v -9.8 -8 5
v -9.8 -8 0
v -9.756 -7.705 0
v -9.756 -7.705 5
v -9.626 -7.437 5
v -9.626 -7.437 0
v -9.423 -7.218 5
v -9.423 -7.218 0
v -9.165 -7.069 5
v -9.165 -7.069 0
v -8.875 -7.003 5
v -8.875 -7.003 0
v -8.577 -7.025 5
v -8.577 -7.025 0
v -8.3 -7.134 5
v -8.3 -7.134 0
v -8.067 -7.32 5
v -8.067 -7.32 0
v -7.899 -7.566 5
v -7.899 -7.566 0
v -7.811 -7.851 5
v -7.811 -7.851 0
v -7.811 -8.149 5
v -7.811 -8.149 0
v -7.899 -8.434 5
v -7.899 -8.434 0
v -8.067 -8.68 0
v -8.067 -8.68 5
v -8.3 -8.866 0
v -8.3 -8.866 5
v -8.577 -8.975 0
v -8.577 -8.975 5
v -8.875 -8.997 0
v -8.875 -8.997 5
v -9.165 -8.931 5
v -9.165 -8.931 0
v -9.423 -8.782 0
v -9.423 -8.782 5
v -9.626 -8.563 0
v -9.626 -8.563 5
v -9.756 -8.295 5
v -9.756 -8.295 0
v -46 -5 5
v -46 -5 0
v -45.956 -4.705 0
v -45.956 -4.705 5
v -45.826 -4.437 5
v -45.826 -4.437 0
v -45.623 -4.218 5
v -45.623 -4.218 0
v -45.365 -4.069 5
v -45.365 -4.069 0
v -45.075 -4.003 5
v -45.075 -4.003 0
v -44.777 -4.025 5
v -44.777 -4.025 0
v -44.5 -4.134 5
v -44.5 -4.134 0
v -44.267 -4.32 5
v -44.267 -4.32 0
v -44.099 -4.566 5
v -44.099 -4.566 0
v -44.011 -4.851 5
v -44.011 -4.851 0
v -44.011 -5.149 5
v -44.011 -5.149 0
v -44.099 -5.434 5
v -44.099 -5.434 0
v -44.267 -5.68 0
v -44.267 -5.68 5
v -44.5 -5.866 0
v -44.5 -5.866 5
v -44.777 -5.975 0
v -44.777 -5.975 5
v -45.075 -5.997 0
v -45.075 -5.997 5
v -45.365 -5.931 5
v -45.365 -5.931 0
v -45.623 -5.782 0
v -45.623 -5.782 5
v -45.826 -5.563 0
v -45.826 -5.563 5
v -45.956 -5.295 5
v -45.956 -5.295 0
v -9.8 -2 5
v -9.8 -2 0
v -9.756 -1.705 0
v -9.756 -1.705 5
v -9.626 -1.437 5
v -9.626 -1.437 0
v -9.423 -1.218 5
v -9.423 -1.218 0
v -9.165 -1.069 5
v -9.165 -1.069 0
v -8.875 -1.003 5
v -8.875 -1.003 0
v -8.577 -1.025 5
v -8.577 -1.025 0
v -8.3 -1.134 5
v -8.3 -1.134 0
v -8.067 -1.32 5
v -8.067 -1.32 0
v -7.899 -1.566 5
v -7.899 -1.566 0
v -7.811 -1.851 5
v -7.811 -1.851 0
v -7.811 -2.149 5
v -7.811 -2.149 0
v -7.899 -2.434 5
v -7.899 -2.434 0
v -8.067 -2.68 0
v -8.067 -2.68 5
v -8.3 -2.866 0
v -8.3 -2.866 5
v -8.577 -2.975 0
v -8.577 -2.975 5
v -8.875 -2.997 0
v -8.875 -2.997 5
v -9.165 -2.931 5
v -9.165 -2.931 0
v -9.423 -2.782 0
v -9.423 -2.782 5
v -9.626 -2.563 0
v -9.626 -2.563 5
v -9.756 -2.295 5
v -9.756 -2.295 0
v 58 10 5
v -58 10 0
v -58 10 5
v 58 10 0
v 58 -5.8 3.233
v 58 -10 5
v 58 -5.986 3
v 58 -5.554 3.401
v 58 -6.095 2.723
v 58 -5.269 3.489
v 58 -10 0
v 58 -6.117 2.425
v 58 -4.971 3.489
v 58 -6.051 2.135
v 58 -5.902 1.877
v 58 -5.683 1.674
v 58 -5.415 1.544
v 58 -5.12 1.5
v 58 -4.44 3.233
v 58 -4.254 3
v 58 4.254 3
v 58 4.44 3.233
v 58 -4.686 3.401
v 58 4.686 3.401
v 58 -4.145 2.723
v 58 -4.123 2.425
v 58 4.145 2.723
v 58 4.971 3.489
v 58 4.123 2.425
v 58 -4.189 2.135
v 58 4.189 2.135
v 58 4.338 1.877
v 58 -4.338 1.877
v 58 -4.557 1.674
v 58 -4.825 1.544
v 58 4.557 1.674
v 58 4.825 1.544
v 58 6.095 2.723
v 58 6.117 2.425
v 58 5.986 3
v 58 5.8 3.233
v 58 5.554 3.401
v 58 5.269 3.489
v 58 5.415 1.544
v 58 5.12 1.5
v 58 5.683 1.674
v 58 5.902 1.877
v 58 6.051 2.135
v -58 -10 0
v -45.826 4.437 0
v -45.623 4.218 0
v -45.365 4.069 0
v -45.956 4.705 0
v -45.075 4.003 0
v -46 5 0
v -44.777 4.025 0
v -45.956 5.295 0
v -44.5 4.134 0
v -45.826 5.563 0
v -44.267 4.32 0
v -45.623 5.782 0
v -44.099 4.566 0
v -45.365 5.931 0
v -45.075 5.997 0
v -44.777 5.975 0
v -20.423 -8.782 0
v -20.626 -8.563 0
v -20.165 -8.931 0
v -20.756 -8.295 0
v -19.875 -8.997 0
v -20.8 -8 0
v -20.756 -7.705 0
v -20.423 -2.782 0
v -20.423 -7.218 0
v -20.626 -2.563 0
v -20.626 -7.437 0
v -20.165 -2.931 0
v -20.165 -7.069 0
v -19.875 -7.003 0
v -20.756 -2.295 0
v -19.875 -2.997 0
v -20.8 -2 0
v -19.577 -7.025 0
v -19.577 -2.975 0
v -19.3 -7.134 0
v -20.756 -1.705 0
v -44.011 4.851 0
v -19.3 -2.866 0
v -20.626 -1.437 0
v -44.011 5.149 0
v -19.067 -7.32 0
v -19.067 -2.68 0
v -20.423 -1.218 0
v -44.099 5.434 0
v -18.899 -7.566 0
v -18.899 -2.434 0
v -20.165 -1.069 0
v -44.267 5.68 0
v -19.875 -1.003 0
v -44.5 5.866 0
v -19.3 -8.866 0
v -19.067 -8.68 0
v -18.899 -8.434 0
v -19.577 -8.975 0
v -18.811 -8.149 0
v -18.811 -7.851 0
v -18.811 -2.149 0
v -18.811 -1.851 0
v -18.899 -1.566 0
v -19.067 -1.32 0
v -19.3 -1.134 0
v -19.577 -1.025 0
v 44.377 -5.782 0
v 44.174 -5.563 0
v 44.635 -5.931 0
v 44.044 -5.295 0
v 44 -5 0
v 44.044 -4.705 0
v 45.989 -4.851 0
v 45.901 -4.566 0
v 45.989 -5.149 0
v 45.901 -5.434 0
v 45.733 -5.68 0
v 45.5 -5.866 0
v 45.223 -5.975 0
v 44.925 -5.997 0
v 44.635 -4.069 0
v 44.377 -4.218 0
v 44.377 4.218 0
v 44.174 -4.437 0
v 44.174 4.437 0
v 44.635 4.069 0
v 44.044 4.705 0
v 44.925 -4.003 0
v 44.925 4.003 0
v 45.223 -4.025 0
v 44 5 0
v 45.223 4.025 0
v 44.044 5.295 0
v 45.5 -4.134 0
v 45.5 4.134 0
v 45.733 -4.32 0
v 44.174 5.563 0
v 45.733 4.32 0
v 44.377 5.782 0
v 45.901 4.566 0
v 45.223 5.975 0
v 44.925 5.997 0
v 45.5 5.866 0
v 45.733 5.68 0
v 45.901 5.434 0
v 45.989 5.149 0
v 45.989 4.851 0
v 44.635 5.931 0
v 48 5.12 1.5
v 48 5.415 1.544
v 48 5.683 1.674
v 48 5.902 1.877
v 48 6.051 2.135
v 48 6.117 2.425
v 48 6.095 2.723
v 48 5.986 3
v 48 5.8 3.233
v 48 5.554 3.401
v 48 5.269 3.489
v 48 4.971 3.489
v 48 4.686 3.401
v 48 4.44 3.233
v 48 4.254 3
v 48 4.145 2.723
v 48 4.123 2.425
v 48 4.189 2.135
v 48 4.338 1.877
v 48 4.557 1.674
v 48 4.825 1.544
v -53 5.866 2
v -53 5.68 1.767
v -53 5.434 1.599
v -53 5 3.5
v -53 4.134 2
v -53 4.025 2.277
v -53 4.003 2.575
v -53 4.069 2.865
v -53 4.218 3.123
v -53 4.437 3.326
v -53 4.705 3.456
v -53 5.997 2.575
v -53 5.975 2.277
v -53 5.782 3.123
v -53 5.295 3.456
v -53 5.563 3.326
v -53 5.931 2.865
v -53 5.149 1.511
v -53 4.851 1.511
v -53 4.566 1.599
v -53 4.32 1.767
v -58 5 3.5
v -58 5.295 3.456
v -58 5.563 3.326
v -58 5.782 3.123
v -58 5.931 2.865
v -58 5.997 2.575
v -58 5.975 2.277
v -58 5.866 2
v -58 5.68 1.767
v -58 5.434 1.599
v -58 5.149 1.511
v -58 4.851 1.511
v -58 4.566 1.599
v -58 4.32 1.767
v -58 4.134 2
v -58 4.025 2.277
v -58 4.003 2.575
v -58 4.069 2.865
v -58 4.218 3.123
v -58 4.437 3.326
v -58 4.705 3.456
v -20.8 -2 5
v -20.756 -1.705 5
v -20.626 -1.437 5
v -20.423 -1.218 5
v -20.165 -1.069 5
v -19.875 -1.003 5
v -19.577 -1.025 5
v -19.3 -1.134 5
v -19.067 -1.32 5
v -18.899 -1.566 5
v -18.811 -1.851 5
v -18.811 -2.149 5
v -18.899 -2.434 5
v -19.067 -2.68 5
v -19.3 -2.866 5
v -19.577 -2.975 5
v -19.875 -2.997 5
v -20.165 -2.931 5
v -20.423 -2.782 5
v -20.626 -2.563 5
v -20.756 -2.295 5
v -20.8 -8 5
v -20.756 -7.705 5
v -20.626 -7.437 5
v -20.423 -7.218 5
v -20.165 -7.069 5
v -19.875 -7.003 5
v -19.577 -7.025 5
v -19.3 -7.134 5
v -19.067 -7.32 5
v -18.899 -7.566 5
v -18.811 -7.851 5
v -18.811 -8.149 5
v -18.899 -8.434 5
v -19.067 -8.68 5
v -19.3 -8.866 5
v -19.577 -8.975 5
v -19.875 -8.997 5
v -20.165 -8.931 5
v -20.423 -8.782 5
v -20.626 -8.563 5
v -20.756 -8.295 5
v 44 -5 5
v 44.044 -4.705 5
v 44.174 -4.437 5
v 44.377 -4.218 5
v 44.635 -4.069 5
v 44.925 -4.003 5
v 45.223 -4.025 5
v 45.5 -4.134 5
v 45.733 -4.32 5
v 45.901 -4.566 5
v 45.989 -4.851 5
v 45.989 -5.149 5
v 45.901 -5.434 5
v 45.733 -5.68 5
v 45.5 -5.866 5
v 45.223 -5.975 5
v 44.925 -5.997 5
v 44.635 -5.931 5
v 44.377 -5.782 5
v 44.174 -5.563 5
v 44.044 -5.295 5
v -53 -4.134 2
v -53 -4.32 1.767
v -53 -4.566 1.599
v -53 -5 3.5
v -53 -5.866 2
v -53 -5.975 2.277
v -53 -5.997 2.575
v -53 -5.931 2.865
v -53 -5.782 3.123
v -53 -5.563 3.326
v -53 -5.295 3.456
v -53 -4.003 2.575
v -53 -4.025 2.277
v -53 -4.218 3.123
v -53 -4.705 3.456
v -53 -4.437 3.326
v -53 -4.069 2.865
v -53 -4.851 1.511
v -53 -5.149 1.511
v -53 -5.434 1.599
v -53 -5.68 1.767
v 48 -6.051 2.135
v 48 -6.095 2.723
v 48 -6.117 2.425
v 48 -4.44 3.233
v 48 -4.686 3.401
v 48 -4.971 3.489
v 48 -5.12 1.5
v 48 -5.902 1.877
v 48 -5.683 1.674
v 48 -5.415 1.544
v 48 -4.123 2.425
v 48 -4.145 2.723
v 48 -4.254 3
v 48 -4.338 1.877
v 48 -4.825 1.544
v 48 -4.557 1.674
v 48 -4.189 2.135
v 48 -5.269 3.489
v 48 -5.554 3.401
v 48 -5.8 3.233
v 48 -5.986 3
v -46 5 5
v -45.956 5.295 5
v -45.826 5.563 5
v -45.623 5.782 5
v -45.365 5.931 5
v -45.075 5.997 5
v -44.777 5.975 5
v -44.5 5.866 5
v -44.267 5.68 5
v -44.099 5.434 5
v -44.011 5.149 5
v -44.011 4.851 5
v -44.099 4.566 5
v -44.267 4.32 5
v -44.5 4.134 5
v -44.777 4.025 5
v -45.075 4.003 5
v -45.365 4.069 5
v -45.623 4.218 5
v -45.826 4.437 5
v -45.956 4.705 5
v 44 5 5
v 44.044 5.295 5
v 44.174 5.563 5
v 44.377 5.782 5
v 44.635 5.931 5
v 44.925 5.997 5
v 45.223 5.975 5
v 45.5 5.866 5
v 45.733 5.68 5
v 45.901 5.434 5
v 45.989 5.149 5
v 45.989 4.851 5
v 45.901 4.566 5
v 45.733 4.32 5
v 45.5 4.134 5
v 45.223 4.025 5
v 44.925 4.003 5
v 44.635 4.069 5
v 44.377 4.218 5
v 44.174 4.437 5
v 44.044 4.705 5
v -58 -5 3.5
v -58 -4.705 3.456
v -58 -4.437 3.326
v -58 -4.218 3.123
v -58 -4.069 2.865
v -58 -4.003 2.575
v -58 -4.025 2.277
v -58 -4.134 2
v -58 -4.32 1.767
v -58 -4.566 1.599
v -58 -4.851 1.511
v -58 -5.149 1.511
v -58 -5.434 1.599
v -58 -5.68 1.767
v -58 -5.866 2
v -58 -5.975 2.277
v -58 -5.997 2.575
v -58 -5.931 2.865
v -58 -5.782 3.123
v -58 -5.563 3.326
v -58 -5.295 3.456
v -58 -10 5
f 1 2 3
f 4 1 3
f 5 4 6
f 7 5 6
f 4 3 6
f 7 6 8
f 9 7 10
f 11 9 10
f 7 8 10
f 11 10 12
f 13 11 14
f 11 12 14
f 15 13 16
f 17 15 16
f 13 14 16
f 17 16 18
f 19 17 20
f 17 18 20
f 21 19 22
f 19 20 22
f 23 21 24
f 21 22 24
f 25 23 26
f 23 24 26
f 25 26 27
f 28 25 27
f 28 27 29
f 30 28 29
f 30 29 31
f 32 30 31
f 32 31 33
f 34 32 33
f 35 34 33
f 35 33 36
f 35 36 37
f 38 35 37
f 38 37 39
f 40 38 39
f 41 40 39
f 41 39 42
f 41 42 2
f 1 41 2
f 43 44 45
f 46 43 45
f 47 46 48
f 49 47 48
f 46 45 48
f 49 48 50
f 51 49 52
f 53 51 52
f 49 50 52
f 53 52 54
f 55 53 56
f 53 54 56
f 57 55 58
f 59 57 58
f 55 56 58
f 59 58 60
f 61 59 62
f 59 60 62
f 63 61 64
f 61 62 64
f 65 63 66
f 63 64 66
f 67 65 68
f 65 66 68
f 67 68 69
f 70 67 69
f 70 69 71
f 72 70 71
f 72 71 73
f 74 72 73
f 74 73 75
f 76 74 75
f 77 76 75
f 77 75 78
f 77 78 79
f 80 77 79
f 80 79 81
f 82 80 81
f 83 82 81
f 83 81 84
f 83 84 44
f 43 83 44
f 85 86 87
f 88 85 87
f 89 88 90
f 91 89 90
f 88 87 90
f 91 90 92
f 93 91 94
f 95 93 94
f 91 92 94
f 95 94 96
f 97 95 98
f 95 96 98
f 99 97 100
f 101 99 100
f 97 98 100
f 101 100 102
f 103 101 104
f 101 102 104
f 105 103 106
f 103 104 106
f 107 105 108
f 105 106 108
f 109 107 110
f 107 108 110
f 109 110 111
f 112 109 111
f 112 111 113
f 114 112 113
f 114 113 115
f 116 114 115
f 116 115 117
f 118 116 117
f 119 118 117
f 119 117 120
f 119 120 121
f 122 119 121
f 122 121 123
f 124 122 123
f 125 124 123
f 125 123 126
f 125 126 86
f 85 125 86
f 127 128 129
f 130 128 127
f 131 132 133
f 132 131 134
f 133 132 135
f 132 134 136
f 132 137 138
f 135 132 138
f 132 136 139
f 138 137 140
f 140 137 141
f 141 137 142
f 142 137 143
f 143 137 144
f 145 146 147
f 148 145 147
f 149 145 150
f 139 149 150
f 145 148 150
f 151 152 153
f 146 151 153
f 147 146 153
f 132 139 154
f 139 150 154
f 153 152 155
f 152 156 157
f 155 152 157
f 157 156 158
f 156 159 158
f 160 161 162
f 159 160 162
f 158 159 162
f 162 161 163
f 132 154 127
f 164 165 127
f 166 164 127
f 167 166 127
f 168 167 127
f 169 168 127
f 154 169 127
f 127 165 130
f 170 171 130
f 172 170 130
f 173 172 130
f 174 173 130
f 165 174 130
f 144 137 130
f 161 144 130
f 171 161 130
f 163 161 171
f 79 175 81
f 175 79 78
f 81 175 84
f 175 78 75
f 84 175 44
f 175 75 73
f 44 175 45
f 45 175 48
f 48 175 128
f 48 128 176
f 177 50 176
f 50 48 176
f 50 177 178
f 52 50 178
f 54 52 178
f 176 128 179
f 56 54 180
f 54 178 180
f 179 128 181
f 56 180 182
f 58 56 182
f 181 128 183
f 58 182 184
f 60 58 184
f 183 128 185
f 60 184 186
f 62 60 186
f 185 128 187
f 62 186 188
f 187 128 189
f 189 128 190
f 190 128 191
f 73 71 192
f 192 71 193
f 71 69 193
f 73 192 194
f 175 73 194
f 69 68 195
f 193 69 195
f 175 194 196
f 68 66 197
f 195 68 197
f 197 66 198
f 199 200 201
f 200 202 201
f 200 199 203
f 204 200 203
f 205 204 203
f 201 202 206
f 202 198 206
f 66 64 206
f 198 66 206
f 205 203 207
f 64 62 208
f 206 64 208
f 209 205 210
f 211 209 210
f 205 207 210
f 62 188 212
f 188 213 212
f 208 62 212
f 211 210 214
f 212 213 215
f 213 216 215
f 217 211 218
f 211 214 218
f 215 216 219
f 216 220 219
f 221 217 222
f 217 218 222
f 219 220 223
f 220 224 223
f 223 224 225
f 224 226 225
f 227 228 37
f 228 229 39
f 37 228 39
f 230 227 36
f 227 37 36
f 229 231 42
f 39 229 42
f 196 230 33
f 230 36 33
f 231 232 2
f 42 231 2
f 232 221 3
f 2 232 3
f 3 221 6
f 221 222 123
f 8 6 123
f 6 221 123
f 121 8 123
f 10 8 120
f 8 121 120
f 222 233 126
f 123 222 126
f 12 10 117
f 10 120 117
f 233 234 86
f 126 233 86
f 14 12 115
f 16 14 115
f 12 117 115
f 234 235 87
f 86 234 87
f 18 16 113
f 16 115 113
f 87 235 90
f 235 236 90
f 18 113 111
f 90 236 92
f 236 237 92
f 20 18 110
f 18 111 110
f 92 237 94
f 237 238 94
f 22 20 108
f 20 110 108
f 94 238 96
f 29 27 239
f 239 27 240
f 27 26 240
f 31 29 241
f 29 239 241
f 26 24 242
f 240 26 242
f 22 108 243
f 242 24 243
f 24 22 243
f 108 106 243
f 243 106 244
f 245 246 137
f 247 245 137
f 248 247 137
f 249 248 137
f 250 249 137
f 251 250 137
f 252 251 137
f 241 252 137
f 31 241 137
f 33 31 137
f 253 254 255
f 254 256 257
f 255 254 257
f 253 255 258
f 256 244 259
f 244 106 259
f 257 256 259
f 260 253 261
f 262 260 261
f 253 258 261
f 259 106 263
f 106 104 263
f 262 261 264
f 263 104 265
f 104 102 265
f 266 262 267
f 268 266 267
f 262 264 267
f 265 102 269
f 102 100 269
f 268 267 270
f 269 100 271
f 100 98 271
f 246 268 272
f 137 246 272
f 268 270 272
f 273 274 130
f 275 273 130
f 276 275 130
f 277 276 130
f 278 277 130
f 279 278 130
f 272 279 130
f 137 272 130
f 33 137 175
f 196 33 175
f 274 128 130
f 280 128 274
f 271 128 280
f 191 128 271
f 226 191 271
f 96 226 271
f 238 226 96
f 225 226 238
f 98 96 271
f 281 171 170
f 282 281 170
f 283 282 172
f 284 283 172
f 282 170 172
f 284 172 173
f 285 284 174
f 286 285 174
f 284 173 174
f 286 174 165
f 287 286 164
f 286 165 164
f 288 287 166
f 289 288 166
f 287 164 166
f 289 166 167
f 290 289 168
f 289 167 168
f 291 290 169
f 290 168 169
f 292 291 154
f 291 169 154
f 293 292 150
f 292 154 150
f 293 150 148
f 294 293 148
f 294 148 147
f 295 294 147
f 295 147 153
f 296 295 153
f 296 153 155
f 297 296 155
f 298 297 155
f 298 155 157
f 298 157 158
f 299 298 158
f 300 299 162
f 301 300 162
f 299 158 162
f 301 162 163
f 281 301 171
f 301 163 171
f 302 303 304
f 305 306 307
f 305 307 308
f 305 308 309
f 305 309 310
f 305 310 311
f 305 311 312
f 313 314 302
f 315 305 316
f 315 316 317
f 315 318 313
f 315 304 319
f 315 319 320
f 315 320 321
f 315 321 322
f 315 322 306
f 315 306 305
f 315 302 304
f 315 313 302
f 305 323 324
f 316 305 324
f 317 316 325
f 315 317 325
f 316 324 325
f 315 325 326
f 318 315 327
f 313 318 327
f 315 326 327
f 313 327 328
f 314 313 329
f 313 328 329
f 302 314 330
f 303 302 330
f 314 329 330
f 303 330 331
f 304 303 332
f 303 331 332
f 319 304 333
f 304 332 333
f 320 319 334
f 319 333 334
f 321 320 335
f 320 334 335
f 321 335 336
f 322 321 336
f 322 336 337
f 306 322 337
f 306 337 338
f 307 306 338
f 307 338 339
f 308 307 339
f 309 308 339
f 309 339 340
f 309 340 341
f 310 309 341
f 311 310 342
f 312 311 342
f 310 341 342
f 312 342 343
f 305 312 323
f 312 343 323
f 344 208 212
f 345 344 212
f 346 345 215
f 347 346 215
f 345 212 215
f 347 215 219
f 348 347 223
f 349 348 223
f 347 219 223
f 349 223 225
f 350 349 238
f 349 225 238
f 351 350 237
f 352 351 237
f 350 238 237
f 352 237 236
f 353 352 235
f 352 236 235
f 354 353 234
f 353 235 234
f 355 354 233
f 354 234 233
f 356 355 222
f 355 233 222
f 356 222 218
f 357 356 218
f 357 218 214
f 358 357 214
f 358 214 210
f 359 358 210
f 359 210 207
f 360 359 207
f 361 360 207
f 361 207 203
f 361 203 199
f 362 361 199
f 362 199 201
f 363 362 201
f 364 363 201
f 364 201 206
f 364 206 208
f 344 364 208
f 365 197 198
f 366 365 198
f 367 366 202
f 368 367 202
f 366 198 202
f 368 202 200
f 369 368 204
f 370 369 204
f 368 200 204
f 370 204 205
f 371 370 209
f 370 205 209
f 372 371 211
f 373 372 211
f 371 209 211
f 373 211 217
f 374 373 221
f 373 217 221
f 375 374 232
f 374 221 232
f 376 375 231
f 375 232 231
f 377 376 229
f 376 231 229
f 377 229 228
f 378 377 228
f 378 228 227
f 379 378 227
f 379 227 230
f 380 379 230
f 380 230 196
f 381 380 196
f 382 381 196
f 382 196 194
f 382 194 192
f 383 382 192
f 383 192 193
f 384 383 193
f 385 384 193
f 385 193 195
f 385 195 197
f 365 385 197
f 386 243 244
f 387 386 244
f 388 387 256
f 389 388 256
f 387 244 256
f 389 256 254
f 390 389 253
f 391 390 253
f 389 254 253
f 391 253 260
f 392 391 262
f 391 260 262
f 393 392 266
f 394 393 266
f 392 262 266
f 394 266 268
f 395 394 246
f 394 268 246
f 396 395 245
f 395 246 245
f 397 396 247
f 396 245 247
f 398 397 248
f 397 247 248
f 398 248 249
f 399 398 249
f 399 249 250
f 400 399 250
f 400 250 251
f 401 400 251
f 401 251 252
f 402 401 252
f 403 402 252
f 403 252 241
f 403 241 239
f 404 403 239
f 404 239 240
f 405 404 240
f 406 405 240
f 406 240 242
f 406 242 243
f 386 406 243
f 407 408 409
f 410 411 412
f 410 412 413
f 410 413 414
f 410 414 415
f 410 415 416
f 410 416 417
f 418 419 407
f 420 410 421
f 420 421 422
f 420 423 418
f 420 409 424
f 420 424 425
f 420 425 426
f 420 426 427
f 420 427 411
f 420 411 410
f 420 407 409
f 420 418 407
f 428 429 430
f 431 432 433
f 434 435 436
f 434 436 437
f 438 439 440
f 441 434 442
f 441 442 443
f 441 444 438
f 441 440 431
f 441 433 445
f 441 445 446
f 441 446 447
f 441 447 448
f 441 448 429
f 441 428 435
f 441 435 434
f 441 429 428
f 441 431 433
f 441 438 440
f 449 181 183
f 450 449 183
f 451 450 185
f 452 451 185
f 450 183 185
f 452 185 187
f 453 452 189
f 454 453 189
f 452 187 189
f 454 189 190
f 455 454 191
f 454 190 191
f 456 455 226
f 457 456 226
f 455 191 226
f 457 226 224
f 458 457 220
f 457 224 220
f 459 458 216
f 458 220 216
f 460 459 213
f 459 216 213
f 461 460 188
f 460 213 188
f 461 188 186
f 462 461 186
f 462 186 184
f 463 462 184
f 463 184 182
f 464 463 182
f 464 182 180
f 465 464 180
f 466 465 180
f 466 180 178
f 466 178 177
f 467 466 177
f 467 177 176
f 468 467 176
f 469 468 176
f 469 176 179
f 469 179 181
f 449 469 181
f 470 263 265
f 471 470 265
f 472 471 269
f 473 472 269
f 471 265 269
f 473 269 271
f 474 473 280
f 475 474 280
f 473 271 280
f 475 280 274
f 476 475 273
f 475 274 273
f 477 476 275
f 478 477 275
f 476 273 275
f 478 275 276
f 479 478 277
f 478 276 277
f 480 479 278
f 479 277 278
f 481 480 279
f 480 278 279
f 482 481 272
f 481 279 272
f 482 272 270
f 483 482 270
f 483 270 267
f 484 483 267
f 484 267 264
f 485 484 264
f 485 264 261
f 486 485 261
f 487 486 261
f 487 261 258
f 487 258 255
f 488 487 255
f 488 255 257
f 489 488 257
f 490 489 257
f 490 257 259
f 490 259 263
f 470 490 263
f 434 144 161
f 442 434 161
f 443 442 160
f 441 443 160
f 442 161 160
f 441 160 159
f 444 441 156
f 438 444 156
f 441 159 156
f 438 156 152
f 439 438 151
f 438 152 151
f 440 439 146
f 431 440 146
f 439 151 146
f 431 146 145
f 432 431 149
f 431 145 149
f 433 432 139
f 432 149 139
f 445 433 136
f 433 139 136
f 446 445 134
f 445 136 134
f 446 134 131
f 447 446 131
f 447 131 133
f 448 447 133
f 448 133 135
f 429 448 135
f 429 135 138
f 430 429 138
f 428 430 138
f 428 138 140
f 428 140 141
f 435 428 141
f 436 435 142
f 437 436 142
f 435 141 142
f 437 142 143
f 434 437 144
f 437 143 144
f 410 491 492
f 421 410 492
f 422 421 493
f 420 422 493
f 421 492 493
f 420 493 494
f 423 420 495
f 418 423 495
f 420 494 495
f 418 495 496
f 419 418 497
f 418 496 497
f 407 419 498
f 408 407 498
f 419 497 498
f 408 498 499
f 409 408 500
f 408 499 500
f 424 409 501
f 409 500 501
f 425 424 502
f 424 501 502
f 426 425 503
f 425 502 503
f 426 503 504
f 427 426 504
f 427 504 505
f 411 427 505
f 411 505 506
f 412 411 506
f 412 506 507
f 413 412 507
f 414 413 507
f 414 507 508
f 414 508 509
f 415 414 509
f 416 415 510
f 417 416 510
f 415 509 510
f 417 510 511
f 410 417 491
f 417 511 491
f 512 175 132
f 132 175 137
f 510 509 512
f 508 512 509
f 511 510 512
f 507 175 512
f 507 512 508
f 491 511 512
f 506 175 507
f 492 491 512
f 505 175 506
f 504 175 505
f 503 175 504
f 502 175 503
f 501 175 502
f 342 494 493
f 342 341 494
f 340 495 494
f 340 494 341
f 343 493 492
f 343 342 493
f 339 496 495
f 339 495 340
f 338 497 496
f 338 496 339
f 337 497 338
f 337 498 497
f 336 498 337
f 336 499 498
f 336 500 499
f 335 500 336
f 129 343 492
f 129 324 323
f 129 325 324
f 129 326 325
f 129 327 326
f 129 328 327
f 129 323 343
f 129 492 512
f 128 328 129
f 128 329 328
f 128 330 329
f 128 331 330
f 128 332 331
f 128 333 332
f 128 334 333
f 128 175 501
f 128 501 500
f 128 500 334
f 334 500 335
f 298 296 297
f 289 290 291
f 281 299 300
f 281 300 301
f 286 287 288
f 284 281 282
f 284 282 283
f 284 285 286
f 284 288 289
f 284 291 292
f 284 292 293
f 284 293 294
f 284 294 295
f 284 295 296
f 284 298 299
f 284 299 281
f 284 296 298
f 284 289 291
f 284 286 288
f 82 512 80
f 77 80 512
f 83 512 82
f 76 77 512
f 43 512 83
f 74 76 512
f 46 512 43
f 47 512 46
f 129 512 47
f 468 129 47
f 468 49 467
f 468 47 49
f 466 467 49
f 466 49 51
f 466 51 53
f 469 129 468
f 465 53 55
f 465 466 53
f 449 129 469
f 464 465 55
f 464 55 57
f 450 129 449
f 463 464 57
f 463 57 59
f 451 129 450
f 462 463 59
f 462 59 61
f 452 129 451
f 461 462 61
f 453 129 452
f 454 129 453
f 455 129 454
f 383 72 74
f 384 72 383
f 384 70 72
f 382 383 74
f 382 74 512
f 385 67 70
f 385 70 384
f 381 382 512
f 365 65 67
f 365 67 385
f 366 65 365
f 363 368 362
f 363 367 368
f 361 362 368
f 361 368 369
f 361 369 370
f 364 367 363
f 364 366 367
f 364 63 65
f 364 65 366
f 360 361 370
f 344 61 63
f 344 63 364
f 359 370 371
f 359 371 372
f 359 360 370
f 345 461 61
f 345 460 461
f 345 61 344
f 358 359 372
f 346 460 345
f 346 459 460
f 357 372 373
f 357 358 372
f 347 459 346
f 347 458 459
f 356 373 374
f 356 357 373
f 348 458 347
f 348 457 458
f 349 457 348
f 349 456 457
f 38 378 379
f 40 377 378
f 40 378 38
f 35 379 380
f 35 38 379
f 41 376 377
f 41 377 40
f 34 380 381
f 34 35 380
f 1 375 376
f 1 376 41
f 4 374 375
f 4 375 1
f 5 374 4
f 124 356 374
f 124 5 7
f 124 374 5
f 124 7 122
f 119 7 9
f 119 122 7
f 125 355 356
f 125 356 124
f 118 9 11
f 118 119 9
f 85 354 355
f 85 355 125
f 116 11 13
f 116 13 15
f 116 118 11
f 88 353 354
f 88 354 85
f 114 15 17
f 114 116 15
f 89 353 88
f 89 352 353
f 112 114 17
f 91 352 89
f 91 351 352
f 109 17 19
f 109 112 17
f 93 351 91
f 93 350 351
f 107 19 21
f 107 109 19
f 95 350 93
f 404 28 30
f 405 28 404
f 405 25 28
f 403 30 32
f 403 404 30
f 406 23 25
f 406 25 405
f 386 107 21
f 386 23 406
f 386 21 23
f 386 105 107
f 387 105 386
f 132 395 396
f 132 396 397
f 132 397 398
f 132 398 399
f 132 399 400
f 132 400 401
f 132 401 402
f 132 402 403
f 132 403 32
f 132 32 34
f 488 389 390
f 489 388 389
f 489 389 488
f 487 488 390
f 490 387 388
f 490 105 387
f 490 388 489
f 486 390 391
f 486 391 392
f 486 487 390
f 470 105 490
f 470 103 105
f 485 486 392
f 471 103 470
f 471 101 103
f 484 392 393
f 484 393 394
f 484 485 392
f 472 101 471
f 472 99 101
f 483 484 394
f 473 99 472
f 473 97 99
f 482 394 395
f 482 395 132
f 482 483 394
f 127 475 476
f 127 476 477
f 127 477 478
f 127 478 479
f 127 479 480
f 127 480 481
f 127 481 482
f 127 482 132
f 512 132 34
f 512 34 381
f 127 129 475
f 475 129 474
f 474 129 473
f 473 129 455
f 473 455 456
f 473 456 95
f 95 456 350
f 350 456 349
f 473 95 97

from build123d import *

# Parameters (mm, degrees)
SKETCH1_W           = 116
SKETCH1_H           = 20
BOSS_EXTRUDE2_DEPTH = 5
SKETCH4_R           = 1
CUT_EXTRUDE1_DEPTH  = 10
SKETCH6_R           = 1
CUT_EXTRUDE2_DEPTH  = 5
SKETCH7_R           = 1
CUT_EXTRUDE3_DEPTH  = 6
SKETCH8_R           = 1
CUT_EXTRUDE4_DEPTH  = 6


with BuildPart() as part:
    # Sketch1 → Boss-Extrude2 (new body)
    with BuildSketch(Plane.XY):
        Rectangle(SKETCH1_W, SKETCH1_H)
    extrude(amount=BOSS_EXTRUDE2_DEPTH)

    # Sketch4 → Cut-Extrude1 (cut)
    with BuildSketch(Plane(origin=(58, 0, 0), x_dir=(0, 0, -1), z_dir=(1, 0, 0))):
        with Locations((-2.5, -5.12)):
            Circle(SKETCH4_R)
        with Locations((-2.5, 5.12)):
            Circle(SKETCH4_R)
    extrude(amount=-CUT_EXTRUDE1_DEPTH, mode=Mode.SUBTRACT)

    # Sketch6 → Cut-Extrude2 (cut)
    with BuildSketch(Plane.ZY.offset(58)):
        with Locations((2.5, 5)):
            Circle(SKETCH6_R)
        with Locations((2.5, -5)):
            Circle(SKETCH6_R)
    extrude(amount=-CUT_EXTRUDE2_DEPTH, mode=Mode.SUBTRACT)

    # Sketch7 → Cut-Extrude3 (cut, through all)
    with BuildSketch(Plane(origin=(0, 0, 0), x_dir=(-1, 0, 0), z_dir=(0, 0, -1))):
        with Locations((-45, 5)):
            Circle(SKETCH7_R)
        with Locations((-45, -5)):
            Circle(SKETCH7_R)
        with Locations((45, 5)):
            Circle(SKETCH7_R)
        with Locations((45, -5)):
            Circle(SKETCH7_R)
    extrude(amount=-CUT_EXTRUDE3_DEPTH, mode=Mode.SUBTRACT)

    # Sketch8 → Cut-Extrude4 (cut, through all)
    with BuildSketch(Plane(origin=(0, 0, 0), x_dir=(-1, 0, 0), z_dir=(0, 0, -1))):
        with Locations((19.8, -8)):
            Circle(SKETCH8_R)
        with Locations((19.8, -2)):
            Circle(SKETCH8_R)
        with Locations((8.8, -2)):
            Circle(SKETCH8_R)
        with Locations((8.8, -8)):
            Circle(SKETCH8_R)
    extrude(amount=-CUT_EXTRUDE4_DEPTH, mode=Mode.SUBTRACT)


solid = part.part
